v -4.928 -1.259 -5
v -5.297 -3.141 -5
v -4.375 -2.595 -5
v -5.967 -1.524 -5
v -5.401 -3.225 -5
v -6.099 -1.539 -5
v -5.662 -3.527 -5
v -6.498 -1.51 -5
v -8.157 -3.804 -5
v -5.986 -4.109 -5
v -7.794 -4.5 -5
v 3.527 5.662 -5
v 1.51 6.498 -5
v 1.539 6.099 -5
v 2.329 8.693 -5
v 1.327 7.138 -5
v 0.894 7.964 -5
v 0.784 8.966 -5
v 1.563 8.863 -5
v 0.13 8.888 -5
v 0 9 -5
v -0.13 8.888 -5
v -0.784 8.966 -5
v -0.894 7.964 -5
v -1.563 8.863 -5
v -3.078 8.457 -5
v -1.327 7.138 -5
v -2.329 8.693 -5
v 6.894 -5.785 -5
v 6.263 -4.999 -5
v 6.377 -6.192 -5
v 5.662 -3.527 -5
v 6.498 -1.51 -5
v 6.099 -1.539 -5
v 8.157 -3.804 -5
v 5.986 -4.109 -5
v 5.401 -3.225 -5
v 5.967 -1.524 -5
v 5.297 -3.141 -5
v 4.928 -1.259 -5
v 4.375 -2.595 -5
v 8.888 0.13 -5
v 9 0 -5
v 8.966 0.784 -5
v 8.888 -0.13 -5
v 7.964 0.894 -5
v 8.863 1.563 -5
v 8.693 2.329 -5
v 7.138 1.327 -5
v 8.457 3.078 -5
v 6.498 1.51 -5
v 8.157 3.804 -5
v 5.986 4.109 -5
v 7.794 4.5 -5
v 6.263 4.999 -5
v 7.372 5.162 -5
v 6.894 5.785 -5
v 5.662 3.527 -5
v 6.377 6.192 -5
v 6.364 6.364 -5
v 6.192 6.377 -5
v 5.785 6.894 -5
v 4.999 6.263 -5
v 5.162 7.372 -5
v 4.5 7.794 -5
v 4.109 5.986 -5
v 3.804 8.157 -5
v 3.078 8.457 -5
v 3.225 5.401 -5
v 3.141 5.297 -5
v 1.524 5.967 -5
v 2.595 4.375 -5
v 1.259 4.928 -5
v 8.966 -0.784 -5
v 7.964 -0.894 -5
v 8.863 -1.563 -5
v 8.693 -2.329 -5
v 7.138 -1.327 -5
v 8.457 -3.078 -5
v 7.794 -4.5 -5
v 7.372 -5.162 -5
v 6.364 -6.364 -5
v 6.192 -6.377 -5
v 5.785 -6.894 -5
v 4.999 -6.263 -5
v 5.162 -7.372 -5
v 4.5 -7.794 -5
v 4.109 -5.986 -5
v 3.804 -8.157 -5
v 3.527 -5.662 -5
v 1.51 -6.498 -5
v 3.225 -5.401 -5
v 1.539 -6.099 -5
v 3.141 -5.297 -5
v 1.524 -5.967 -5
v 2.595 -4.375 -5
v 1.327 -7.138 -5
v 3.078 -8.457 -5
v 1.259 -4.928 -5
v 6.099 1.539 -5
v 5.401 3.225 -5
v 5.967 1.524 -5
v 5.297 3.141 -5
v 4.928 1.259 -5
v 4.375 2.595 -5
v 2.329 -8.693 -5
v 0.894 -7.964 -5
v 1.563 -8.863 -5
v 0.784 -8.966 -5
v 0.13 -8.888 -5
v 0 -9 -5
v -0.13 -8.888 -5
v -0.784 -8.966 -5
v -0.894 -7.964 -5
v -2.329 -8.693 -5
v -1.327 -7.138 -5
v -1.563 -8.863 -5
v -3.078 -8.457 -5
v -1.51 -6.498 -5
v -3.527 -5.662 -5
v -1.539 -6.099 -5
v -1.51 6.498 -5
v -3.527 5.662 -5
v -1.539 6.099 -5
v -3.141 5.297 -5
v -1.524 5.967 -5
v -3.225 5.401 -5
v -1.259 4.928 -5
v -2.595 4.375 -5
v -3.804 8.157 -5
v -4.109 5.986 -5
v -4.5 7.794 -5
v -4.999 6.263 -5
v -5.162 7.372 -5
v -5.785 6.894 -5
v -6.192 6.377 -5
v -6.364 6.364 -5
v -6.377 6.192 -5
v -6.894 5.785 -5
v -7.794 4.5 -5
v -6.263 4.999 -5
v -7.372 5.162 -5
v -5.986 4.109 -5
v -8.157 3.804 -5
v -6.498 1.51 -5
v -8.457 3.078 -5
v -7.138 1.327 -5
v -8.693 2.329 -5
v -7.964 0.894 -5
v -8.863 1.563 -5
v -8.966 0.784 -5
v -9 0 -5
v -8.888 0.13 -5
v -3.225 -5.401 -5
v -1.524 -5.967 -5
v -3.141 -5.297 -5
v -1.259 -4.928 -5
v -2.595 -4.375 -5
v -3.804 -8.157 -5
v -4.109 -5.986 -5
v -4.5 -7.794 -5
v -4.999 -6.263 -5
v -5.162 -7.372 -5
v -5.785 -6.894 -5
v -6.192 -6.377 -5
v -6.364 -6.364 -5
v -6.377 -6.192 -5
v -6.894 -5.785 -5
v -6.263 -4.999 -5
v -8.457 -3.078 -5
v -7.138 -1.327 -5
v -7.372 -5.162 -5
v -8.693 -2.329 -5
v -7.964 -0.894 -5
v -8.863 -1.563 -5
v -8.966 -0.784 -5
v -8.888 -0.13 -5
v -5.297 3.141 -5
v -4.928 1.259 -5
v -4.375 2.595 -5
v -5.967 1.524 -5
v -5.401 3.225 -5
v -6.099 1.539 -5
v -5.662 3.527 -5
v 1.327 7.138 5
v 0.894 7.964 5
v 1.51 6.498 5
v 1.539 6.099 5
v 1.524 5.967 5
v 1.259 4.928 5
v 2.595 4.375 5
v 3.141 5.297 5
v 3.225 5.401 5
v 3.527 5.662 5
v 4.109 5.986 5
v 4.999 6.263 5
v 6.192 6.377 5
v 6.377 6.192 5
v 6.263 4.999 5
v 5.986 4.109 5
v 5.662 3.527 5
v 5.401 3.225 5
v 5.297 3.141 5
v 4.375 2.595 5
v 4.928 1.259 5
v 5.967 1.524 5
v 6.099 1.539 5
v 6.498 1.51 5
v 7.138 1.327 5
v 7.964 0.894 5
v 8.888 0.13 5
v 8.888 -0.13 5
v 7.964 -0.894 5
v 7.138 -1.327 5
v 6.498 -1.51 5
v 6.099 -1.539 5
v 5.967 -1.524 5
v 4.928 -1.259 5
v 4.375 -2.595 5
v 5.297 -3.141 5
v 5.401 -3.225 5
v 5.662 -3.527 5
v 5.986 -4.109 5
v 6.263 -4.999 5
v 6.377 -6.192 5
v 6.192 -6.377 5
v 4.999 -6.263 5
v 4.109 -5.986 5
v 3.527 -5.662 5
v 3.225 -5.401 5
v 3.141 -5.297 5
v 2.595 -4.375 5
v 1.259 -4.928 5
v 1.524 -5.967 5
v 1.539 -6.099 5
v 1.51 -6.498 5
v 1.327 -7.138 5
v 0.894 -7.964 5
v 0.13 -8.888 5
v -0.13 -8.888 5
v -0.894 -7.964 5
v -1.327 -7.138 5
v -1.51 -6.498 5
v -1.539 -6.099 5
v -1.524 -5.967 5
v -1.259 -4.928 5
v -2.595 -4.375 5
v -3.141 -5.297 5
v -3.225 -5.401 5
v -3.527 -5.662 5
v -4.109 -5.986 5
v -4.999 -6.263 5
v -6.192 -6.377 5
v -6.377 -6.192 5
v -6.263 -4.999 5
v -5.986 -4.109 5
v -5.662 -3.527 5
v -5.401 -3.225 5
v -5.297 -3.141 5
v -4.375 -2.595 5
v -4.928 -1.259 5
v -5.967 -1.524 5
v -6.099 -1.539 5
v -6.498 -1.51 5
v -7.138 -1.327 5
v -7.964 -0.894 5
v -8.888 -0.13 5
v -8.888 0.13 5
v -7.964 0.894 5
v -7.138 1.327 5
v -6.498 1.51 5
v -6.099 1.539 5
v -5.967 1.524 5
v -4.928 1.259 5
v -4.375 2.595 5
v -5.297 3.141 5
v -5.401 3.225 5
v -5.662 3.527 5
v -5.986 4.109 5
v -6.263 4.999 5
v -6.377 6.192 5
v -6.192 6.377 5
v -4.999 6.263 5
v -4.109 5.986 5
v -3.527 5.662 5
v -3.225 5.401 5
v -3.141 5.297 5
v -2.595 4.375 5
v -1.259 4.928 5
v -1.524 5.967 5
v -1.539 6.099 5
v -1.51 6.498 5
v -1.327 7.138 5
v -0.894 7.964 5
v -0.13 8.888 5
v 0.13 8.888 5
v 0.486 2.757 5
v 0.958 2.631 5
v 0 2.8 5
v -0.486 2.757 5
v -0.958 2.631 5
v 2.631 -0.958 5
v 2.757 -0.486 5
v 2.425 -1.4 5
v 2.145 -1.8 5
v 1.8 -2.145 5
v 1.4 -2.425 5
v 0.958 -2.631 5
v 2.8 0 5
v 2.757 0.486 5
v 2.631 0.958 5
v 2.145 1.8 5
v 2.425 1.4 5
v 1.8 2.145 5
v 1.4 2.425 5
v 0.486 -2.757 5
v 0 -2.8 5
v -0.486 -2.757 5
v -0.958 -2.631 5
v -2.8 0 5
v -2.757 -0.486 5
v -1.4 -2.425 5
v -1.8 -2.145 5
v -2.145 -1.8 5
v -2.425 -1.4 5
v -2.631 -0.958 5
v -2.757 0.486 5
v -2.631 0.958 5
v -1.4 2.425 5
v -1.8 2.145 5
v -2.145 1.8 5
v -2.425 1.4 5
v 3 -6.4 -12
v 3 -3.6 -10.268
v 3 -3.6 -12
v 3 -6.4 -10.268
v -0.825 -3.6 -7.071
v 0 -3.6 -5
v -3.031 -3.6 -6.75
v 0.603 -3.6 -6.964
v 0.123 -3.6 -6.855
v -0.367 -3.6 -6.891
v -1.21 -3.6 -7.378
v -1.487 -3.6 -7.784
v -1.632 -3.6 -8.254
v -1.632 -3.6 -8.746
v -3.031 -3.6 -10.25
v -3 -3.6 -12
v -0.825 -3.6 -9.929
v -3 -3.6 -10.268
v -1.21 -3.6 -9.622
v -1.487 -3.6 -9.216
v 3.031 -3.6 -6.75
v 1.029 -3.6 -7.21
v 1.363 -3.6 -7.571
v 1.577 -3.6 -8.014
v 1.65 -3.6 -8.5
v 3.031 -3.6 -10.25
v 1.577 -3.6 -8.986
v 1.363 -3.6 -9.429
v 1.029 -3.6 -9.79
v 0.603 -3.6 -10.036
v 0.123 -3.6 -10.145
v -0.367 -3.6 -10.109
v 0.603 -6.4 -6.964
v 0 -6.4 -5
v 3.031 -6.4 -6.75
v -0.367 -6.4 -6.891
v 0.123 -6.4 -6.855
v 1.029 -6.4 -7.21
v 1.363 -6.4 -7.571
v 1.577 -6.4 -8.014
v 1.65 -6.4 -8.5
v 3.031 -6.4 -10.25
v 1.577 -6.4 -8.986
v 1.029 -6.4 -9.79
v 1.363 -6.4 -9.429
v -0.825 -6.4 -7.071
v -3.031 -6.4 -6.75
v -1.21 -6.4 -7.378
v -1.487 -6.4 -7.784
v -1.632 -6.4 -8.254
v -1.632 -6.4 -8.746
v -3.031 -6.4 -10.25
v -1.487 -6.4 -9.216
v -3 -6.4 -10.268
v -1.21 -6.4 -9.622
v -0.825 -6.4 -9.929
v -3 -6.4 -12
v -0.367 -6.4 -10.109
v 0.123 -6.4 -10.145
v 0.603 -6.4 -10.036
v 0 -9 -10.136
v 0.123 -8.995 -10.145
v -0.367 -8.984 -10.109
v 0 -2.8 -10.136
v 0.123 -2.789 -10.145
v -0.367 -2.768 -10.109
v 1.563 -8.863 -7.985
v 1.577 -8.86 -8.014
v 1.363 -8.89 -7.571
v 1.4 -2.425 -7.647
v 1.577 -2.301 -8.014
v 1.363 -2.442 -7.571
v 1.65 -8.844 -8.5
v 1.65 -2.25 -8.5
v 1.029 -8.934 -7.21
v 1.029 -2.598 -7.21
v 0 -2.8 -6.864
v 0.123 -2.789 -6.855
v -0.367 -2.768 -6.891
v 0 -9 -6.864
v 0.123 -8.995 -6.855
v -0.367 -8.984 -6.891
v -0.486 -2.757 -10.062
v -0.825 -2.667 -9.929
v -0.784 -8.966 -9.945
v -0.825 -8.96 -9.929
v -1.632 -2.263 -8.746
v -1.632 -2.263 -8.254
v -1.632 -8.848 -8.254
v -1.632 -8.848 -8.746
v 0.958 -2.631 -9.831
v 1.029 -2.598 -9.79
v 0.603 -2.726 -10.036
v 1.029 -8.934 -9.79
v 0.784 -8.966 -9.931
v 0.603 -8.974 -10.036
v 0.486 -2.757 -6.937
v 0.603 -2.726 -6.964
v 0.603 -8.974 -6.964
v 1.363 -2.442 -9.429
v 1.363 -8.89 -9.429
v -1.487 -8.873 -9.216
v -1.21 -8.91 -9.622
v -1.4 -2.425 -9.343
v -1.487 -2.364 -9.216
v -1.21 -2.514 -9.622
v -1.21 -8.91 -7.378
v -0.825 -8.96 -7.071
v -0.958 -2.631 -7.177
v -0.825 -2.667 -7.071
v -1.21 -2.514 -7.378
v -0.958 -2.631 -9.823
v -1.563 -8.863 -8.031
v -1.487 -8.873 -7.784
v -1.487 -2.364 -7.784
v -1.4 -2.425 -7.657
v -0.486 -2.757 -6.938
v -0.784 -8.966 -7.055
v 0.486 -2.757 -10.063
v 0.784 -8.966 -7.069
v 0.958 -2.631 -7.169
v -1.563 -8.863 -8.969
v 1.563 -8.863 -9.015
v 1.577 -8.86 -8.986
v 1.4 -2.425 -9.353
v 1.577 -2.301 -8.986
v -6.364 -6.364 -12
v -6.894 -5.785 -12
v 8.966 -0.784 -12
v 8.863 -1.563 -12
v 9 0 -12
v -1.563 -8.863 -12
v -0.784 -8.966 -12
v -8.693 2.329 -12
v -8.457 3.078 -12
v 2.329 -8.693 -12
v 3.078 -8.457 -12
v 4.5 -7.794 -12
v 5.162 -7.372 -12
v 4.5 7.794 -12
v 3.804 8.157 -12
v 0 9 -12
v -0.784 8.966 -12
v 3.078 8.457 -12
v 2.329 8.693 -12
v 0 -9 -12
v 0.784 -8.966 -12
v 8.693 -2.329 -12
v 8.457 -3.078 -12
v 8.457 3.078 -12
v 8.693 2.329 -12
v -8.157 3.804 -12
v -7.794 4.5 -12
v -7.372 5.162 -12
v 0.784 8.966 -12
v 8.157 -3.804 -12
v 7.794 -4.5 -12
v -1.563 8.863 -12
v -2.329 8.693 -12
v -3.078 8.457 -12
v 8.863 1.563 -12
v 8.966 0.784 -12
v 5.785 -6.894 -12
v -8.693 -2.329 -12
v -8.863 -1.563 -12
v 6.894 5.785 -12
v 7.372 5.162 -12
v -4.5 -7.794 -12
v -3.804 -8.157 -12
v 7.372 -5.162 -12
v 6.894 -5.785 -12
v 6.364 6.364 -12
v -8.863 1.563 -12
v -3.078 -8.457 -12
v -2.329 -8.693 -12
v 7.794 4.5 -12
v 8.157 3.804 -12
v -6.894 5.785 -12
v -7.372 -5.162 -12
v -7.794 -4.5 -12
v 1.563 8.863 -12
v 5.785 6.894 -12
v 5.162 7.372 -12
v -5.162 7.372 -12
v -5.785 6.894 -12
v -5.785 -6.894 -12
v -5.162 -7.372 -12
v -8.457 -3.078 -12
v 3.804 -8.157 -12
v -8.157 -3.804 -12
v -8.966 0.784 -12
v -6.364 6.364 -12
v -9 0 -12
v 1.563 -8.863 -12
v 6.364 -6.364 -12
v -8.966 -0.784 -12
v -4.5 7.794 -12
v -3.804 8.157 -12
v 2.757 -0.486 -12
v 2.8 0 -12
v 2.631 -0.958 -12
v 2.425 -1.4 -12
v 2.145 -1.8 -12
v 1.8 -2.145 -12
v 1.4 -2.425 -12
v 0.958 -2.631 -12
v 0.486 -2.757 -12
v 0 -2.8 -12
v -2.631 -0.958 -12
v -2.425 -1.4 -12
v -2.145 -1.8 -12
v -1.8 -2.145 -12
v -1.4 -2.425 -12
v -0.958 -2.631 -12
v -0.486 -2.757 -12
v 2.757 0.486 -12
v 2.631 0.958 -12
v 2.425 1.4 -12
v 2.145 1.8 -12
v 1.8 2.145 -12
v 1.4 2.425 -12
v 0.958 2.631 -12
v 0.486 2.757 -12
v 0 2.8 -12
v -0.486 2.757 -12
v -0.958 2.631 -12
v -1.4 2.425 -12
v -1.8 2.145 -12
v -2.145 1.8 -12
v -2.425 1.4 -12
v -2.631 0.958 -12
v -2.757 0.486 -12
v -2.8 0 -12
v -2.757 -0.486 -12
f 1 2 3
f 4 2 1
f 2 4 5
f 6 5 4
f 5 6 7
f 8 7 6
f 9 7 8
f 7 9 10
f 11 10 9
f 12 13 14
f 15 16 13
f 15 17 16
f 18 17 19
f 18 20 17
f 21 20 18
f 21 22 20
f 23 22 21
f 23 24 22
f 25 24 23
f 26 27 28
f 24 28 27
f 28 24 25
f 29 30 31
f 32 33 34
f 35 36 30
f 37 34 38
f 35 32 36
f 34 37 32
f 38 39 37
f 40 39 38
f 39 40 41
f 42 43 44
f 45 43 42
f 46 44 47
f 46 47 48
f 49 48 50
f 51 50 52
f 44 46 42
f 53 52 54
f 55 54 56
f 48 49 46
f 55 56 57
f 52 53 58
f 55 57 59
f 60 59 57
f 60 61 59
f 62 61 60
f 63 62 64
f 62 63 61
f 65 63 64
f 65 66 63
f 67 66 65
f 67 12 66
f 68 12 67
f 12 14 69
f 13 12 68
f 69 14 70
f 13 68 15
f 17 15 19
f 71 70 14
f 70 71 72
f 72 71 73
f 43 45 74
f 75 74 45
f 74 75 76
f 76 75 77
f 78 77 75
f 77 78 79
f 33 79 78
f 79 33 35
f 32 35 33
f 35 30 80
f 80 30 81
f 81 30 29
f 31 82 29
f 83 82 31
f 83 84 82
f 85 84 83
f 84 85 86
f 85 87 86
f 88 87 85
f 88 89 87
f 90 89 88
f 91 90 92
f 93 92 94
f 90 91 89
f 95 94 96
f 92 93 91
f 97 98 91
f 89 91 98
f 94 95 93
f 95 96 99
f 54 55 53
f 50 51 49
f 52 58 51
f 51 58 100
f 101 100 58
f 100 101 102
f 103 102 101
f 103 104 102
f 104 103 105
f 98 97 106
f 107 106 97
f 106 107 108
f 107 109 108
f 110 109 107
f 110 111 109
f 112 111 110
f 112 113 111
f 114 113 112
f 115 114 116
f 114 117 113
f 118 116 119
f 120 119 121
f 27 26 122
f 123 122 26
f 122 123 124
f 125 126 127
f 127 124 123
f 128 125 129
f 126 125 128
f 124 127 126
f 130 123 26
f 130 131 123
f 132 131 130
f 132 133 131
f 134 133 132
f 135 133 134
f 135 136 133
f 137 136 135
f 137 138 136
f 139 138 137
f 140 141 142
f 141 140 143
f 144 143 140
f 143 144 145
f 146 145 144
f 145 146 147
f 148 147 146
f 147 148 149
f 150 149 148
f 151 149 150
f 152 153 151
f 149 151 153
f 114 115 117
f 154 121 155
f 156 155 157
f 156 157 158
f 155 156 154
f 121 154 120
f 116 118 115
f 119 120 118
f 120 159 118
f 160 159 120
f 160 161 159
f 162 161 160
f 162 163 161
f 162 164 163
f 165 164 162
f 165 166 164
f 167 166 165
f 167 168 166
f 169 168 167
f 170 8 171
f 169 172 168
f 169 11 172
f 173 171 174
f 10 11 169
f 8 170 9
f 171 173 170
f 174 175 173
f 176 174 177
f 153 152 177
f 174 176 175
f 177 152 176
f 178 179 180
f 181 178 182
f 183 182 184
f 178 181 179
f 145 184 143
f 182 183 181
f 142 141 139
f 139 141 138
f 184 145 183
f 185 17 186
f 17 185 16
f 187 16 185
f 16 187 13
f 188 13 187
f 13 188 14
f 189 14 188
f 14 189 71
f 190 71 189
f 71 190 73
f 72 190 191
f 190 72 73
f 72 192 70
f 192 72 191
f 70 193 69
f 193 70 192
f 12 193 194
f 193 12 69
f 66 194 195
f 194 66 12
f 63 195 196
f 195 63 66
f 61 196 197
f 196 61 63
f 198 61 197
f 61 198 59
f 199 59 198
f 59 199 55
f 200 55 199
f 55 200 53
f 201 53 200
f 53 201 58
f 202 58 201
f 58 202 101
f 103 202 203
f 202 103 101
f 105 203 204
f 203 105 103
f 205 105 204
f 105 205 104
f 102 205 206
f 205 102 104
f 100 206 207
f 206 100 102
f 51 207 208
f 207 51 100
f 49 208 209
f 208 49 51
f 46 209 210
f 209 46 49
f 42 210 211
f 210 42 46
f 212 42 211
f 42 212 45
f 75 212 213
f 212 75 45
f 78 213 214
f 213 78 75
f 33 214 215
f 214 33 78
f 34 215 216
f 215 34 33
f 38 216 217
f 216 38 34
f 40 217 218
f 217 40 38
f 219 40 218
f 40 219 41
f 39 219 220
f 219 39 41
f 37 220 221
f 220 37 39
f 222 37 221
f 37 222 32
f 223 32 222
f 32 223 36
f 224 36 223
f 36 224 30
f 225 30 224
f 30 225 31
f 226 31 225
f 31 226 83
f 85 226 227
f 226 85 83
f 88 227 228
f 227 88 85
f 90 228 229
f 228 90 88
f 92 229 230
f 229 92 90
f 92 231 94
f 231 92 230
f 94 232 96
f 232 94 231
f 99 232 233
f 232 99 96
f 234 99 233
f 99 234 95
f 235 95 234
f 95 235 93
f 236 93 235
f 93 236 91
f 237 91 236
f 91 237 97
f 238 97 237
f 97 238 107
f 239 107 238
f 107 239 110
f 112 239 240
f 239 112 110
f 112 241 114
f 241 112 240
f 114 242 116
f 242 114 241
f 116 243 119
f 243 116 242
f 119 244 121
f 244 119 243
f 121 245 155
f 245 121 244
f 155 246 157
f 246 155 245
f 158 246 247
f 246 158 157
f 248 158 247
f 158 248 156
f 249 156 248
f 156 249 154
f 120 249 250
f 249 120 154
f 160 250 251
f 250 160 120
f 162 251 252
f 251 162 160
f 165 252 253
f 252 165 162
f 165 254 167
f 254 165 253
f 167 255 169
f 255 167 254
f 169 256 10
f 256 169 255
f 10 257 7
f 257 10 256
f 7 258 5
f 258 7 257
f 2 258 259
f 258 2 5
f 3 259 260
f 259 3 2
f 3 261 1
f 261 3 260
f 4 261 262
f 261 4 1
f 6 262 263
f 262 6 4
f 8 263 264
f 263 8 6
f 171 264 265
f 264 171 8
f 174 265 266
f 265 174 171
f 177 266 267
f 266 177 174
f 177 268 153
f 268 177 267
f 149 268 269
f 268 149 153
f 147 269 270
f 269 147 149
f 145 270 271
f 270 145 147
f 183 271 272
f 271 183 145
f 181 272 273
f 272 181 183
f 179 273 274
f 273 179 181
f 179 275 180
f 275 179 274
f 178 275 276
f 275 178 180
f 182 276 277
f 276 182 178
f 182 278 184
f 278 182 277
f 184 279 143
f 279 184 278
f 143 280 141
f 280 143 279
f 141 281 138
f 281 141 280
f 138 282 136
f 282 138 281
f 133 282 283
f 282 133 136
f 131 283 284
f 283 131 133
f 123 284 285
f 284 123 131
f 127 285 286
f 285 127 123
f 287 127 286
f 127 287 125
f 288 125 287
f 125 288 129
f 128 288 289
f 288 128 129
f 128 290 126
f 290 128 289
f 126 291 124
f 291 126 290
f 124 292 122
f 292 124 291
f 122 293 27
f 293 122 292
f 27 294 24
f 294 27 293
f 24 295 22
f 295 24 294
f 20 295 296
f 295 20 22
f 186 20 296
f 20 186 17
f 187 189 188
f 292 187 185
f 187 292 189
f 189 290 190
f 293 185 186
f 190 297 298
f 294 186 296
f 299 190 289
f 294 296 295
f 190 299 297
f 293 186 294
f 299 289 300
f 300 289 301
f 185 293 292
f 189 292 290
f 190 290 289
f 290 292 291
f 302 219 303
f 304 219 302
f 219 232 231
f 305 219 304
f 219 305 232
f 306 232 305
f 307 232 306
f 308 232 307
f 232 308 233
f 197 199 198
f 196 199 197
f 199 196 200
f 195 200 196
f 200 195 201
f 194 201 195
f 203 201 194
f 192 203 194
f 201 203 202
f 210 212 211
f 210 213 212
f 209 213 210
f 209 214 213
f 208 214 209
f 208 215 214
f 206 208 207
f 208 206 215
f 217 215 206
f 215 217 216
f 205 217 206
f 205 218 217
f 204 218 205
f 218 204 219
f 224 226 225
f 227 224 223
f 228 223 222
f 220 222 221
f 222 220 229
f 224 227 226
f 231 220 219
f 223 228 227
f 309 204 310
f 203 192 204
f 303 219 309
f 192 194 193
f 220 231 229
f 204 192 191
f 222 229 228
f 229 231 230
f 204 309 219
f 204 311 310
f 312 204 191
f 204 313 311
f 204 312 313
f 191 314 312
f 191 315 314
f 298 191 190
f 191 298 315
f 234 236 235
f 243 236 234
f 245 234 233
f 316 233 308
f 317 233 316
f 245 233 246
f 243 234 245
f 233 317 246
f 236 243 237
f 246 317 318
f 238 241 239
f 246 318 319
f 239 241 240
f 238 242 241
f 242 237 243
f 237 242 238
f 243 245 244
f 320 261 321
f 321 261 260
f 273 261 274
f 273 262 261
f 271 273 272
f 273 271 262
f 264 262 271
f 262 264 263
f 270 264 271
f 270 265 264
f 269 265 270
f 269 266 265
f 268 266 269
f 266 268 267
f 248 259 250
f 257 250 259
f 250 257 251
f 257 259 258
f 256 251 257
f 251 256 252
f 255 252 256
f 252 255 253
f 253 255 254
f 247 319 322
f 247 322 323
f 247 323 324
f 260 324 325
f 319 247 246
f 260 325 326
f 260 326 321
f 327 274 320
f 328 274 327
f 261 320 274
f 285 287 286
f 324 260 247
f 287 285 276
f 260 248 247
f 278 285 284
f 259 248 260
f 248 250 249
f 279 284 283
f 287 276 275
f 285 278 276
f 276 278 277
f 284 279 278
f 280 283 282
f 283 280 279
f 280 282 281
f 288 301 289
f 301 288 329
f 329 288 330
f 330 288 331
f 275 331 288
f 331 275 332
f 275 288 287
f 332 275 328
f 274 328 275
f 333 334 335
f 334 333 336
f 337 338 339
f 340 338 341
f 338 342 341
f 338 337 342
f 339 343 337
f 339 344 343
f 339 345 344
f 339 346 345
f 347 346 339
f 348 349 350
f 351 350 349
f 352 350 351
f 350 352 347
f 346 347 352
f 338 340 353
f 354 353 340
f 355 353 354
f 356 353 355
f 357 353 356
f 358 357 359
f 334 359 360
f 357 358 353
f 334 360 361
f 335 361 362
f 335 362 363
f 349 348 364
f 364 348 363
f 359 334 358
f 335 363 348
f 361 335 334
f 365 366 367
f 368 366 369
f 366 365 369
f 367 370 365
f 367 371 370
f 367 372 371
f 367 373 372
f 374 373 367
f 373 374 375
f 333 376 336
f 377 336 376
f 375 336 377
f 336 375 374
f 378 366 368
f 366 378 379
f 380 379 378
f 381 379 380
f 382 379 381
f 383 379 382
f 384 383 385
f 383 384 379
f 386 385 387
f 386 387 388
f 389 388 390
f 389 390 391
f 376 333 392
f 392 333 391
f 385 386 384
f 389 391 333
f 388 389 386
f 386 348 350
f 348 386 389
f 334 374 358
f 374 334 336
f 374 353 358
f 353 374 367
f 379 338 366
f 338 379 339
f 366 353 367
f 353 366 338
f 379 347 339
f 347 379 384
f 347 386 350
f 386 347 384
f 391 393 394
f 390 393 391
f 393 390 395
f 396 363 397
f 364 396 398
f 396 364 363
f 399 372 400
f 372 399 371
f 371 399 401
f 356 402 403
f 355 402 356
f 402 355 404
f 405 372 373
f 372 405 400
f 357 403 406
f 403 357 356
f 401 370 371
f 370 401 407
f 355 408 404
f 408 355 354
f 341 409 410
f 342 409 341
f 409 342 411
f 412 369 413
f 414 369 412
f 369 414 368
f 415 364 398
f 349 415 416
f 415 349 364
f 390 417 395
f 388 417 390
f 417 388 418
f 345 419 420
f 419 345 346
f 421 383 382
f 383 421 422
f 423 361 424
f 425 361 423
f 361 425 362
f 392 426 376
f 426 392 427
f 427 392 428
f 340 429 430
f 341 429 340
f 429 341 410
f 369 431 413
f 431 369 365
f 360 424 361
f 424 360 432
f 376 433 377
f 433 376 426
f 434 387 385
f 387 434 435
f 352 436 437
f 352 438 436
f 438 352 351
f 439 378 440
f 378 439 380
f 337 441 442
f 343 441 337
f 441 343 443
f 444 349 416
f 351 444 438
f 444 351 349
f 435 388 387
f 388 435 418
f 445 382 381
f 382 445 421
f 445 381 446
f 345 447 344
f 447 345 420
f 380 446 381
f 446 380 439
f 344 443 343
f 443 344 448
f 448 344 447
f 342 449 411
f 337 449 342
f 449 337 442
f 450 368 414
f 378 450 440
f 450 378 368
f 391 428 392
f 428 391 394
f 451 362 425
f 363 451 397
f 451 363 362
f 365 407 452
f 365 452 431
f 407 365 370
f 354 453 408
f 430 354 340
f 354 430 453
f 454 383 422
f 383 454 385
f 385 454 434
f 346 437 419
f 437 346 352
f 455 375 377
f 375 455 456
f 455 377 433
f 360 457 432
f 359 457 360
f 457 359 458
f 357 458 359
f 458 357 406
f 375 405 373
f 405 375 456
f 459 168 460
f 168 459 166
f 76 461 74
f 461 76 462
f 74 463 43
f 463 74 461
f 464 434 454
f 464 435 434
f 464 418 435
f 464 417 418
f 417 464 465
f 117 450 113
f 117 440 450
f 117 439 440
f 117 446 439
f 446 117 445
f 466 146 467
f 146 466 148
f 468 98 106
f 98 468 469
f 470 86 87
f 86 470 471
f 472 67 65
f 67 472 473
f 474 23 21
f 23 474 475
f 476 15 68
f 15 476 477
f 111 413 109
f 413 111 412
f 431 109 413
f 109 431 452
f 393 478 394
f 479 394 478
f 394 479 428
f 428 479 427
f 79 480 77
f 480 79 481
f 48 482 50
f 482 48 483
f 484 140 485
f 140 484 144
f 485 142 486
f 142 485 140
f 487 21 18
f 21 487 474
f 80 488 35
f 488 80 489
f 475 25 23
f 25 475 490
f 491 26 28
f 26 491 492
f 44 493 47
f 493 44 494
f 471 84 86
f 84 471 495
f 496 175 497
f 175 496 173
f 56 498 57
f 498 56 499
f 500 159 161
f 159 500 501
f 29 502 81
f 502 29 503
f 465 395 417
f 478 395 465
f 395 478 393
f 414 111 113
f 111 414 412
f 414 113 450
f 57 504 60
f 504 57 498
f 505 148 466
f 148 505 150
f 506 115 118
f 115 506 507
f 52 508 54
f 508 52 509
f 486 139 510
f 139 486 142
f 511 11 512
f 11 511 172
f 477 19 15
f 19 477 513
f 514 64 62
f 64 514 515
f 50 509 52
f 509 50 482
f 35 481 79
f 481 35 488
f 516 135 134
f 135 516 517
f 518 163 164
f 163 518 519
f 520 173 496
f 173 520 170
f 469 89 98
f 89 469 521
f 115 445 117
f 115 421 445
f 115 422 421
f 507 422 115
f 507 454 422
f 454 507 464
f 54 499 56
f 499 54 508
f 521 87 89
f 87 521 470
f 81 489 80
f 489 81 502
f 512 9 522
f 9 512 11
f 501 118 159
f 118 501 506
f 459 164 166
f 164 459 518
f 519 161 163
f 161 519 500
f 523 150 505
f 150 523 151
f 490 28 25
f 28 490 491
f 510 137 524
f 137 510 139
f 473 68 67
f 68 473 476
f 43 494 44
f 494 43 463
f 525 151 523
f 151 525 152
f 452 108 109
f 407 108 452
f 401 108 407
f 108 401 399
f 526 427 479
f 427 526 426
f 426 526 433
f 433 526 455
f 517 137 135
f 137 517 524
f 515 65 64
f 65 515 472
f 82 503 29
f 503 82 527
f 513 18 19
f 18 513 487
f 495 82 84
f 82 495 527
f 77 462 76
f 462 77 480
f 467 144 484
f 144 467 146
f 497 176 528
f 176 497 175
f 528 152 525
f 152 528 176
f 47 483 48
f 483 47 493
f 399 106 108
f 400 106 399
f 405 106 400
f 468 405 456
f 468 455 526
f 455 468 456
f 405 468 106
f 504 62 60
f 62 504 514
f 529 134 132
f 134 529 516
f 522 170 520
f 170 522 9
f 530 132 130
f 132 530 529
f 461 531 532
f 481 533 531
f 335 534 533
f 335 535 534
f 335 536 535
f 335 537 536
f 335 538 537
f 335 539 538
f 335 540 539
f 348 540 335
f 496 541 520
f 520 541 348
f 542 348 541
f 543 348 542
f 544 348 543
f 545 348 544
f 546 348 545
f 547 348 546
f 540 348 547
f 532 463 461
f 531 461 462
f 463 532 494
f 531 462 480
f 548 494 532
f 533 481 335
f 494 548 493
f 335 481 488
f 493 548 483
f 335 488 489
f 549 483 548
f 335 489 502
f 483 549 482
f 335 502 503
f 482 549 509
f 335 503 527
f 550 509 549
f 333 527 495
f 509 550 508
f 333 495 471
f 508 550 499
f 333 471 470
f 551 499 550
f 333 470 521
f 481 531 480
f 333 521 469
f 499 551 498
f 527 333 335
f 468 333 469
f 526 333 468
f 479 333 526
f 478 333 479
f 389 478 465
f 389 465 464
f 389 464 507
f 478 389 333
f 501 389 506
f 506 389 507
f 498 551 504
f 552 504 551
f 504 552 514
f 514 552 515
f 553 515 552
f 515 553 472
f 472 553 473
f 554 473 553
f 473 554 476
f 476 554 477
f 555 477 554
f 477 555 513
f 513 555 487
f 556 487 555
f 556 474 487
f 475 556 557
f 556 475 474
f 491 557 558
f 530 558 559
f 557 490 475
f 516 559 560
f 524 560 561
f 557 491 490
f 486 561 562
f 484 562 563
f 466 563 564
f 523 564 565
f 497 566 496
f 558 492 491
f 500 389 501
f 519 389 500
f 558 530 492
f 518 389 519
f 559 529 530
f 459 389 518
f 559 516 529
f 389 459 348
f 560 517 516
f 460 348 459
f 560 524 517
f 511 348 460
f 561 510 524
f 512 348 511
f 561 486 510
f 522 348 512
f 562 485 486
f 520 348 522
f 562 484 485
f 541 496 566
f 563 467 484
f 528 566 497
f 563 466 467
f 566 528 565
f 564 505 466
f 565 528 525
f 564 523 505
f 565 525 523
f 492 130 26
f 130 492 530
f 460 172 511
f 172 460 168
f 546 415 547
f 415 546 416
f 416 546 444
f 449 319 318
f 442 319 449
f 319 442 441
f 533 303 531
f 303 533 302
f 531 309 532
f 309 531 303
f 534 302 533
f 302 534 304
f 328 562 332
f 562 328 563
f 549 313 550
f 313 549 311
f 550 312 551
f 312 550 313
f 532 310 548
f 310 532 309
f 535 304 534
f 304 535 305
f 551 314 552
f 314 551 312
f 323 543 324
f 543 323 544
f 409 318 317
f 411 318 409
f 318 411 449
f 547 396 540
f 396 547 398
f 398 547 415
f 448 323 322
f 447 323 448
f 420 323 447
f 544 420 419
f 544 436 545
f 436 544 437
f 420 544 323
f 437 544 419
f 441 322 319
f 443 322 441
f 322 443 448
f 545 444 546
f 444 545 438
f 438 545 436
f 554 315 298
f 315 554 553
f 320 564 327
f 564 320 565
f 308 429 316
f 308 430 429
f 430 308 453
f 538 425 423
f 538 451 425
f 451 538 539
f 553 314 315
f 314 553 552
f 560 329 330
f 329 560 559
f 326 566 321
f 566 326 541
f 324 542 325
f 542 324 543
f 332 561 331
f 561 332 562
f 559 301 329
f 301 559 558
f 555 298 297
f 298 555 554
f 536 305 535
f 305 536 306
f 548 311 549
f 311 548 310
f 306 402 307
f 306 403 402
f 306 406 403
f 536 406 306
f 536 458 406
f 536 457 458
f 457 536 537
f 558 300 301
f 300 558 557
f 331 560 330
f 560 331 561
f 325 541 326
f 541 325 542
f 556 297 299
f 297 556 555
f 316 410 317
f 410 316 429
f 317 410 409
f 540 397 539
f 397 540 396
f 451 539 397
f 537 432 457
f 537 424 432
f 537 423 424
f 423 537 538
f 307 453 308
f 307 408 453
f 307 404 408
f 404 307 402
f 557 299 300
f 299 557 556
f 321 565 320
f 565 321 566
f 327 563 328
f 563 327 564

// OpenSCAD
/* Derived by Carlosgs from:
 * http://www.thingiverse.com/thing:12789
 * An extruder gear set for the TechZone Huxley,
 *	featuring Herringbone teeth.
 * You will have to recalibrate your E_STEPS_PER_MM in
 *	your firmware (ratio changing from original techzone
 *	lasercut gears).
 * This use 2 modules from the MCAD library that you can
 *	get from https://github.com/elmom/MCAD.
 * 
 * Part - the motor gear mount hub with set screw hole -
 *	derived from http://www.thingiverse.com/thing:3104
 *	(thanks GilesBathgate) which is under GPL CC license.
 *
 * August 2013 added 2 extra setscrews to ensure centered usage.
 * by Harry Binnema. 
 *
* Copyright (C) 2011	Guy 'DeuxVis' P.
 *
 * This program is free software; you can redistribute it and/or
 * modify it under the terms of the GNU General Public License
 * as published by the Free Software Foundation; either version 2
 * of the License, or (at your option) any later version.
 * 
 * This program is distributed in the hope that it will be useful,
 * but WITHOUT ANY WARRANTY; without even the implied warranty of
 * MERCHANTABILITY or FITNESS FOR A PARTICULAR PURPOSE.	See the
 * GNU General Public License for more details.

 * You should have received a copy of the GNU General Public License
 * along with this program; if not, write to the Free Software
 * Foundation, Inc., 51 Franklin Street, Fifth Floor, Boston, MA	02110-1301, USA.
 * -- 
 *		 DeuxVis - device@ymail.com */

include <MCAD/materials.scad>
include <MCAD/teardrop.scad>
include <MCAD/involute_gears.scad>

motor_shaft_diameter=5.6;
pos=15.4-1; //position hole for grubnut
nholes = 7;
shaft_diam=9;
shaft_height=7;

// Increase the resolution of default shapes
$fa = 5; // Minimum angle for fragments [degrees]
$fs = 0.5; // Minimum fragment size [mm]

/* Herringbone gear module, adapted from MCAD/involute_gears */
module herringbone_gear( teeth=12, circles=0, shaft=5 ) {
	twist=0;//100;
	height=10;
	pressure_angle=30;

	module myGear() {
		gear(
			number_of_teeth=teeth,
			circular_pitch=320,
			pressure_angle=pressure_angle,
			clearance = 0.2,
			gear_thickness = height/2,
			rim_thickness = height/2,
			rim_width = 1,
			hub_thickness = height/2,
			hub_diameter=1,
			bore_diameter=shaft,
			circles=circles,
			twist=twist/teeth
		);
	}
	
	myGear();
	mirror( [0,0,1] )
		myGear();
}

module cyclone_motor_z_gear(with_extra_parts=false, exploded=false) {
// Motor gear
rotate([180,0,0]) union() difference() {	 
	union() {

		//gear
		herringbone_gear( teeth=8 );

		translate( [0, 0, 12] ) mirror( [0, 0, 1] ) difference() {
			//shaft
			cylinder( r=shaft_diam, h=shaft_height);
			//captive nut and grub holes
			translate( [0, 19.5, 3.5] ) rotate( [90, 0, 0] ) union() {
				//enterance
				translate( [0, -3, 14.5] ) cube( [6, 6, 2.8], center=true );
				//nut
				translate( [0, 0, 14.5] ) rotate( [0, 0, 30] )
					cylinder( r=6/2+0.5, h=2.8, $fn=6, center=true);
				//grub hole
				translate( [0, 0, 9] ) cylinder( r=3.3/2, h=10);
			}
		}
	}

	//shaft hole
	translate( [0, 0, -6] ) cylinder( r=motor_shaft_diameter/2, h=20);
}
}

cyclone_motor_z_gear();
